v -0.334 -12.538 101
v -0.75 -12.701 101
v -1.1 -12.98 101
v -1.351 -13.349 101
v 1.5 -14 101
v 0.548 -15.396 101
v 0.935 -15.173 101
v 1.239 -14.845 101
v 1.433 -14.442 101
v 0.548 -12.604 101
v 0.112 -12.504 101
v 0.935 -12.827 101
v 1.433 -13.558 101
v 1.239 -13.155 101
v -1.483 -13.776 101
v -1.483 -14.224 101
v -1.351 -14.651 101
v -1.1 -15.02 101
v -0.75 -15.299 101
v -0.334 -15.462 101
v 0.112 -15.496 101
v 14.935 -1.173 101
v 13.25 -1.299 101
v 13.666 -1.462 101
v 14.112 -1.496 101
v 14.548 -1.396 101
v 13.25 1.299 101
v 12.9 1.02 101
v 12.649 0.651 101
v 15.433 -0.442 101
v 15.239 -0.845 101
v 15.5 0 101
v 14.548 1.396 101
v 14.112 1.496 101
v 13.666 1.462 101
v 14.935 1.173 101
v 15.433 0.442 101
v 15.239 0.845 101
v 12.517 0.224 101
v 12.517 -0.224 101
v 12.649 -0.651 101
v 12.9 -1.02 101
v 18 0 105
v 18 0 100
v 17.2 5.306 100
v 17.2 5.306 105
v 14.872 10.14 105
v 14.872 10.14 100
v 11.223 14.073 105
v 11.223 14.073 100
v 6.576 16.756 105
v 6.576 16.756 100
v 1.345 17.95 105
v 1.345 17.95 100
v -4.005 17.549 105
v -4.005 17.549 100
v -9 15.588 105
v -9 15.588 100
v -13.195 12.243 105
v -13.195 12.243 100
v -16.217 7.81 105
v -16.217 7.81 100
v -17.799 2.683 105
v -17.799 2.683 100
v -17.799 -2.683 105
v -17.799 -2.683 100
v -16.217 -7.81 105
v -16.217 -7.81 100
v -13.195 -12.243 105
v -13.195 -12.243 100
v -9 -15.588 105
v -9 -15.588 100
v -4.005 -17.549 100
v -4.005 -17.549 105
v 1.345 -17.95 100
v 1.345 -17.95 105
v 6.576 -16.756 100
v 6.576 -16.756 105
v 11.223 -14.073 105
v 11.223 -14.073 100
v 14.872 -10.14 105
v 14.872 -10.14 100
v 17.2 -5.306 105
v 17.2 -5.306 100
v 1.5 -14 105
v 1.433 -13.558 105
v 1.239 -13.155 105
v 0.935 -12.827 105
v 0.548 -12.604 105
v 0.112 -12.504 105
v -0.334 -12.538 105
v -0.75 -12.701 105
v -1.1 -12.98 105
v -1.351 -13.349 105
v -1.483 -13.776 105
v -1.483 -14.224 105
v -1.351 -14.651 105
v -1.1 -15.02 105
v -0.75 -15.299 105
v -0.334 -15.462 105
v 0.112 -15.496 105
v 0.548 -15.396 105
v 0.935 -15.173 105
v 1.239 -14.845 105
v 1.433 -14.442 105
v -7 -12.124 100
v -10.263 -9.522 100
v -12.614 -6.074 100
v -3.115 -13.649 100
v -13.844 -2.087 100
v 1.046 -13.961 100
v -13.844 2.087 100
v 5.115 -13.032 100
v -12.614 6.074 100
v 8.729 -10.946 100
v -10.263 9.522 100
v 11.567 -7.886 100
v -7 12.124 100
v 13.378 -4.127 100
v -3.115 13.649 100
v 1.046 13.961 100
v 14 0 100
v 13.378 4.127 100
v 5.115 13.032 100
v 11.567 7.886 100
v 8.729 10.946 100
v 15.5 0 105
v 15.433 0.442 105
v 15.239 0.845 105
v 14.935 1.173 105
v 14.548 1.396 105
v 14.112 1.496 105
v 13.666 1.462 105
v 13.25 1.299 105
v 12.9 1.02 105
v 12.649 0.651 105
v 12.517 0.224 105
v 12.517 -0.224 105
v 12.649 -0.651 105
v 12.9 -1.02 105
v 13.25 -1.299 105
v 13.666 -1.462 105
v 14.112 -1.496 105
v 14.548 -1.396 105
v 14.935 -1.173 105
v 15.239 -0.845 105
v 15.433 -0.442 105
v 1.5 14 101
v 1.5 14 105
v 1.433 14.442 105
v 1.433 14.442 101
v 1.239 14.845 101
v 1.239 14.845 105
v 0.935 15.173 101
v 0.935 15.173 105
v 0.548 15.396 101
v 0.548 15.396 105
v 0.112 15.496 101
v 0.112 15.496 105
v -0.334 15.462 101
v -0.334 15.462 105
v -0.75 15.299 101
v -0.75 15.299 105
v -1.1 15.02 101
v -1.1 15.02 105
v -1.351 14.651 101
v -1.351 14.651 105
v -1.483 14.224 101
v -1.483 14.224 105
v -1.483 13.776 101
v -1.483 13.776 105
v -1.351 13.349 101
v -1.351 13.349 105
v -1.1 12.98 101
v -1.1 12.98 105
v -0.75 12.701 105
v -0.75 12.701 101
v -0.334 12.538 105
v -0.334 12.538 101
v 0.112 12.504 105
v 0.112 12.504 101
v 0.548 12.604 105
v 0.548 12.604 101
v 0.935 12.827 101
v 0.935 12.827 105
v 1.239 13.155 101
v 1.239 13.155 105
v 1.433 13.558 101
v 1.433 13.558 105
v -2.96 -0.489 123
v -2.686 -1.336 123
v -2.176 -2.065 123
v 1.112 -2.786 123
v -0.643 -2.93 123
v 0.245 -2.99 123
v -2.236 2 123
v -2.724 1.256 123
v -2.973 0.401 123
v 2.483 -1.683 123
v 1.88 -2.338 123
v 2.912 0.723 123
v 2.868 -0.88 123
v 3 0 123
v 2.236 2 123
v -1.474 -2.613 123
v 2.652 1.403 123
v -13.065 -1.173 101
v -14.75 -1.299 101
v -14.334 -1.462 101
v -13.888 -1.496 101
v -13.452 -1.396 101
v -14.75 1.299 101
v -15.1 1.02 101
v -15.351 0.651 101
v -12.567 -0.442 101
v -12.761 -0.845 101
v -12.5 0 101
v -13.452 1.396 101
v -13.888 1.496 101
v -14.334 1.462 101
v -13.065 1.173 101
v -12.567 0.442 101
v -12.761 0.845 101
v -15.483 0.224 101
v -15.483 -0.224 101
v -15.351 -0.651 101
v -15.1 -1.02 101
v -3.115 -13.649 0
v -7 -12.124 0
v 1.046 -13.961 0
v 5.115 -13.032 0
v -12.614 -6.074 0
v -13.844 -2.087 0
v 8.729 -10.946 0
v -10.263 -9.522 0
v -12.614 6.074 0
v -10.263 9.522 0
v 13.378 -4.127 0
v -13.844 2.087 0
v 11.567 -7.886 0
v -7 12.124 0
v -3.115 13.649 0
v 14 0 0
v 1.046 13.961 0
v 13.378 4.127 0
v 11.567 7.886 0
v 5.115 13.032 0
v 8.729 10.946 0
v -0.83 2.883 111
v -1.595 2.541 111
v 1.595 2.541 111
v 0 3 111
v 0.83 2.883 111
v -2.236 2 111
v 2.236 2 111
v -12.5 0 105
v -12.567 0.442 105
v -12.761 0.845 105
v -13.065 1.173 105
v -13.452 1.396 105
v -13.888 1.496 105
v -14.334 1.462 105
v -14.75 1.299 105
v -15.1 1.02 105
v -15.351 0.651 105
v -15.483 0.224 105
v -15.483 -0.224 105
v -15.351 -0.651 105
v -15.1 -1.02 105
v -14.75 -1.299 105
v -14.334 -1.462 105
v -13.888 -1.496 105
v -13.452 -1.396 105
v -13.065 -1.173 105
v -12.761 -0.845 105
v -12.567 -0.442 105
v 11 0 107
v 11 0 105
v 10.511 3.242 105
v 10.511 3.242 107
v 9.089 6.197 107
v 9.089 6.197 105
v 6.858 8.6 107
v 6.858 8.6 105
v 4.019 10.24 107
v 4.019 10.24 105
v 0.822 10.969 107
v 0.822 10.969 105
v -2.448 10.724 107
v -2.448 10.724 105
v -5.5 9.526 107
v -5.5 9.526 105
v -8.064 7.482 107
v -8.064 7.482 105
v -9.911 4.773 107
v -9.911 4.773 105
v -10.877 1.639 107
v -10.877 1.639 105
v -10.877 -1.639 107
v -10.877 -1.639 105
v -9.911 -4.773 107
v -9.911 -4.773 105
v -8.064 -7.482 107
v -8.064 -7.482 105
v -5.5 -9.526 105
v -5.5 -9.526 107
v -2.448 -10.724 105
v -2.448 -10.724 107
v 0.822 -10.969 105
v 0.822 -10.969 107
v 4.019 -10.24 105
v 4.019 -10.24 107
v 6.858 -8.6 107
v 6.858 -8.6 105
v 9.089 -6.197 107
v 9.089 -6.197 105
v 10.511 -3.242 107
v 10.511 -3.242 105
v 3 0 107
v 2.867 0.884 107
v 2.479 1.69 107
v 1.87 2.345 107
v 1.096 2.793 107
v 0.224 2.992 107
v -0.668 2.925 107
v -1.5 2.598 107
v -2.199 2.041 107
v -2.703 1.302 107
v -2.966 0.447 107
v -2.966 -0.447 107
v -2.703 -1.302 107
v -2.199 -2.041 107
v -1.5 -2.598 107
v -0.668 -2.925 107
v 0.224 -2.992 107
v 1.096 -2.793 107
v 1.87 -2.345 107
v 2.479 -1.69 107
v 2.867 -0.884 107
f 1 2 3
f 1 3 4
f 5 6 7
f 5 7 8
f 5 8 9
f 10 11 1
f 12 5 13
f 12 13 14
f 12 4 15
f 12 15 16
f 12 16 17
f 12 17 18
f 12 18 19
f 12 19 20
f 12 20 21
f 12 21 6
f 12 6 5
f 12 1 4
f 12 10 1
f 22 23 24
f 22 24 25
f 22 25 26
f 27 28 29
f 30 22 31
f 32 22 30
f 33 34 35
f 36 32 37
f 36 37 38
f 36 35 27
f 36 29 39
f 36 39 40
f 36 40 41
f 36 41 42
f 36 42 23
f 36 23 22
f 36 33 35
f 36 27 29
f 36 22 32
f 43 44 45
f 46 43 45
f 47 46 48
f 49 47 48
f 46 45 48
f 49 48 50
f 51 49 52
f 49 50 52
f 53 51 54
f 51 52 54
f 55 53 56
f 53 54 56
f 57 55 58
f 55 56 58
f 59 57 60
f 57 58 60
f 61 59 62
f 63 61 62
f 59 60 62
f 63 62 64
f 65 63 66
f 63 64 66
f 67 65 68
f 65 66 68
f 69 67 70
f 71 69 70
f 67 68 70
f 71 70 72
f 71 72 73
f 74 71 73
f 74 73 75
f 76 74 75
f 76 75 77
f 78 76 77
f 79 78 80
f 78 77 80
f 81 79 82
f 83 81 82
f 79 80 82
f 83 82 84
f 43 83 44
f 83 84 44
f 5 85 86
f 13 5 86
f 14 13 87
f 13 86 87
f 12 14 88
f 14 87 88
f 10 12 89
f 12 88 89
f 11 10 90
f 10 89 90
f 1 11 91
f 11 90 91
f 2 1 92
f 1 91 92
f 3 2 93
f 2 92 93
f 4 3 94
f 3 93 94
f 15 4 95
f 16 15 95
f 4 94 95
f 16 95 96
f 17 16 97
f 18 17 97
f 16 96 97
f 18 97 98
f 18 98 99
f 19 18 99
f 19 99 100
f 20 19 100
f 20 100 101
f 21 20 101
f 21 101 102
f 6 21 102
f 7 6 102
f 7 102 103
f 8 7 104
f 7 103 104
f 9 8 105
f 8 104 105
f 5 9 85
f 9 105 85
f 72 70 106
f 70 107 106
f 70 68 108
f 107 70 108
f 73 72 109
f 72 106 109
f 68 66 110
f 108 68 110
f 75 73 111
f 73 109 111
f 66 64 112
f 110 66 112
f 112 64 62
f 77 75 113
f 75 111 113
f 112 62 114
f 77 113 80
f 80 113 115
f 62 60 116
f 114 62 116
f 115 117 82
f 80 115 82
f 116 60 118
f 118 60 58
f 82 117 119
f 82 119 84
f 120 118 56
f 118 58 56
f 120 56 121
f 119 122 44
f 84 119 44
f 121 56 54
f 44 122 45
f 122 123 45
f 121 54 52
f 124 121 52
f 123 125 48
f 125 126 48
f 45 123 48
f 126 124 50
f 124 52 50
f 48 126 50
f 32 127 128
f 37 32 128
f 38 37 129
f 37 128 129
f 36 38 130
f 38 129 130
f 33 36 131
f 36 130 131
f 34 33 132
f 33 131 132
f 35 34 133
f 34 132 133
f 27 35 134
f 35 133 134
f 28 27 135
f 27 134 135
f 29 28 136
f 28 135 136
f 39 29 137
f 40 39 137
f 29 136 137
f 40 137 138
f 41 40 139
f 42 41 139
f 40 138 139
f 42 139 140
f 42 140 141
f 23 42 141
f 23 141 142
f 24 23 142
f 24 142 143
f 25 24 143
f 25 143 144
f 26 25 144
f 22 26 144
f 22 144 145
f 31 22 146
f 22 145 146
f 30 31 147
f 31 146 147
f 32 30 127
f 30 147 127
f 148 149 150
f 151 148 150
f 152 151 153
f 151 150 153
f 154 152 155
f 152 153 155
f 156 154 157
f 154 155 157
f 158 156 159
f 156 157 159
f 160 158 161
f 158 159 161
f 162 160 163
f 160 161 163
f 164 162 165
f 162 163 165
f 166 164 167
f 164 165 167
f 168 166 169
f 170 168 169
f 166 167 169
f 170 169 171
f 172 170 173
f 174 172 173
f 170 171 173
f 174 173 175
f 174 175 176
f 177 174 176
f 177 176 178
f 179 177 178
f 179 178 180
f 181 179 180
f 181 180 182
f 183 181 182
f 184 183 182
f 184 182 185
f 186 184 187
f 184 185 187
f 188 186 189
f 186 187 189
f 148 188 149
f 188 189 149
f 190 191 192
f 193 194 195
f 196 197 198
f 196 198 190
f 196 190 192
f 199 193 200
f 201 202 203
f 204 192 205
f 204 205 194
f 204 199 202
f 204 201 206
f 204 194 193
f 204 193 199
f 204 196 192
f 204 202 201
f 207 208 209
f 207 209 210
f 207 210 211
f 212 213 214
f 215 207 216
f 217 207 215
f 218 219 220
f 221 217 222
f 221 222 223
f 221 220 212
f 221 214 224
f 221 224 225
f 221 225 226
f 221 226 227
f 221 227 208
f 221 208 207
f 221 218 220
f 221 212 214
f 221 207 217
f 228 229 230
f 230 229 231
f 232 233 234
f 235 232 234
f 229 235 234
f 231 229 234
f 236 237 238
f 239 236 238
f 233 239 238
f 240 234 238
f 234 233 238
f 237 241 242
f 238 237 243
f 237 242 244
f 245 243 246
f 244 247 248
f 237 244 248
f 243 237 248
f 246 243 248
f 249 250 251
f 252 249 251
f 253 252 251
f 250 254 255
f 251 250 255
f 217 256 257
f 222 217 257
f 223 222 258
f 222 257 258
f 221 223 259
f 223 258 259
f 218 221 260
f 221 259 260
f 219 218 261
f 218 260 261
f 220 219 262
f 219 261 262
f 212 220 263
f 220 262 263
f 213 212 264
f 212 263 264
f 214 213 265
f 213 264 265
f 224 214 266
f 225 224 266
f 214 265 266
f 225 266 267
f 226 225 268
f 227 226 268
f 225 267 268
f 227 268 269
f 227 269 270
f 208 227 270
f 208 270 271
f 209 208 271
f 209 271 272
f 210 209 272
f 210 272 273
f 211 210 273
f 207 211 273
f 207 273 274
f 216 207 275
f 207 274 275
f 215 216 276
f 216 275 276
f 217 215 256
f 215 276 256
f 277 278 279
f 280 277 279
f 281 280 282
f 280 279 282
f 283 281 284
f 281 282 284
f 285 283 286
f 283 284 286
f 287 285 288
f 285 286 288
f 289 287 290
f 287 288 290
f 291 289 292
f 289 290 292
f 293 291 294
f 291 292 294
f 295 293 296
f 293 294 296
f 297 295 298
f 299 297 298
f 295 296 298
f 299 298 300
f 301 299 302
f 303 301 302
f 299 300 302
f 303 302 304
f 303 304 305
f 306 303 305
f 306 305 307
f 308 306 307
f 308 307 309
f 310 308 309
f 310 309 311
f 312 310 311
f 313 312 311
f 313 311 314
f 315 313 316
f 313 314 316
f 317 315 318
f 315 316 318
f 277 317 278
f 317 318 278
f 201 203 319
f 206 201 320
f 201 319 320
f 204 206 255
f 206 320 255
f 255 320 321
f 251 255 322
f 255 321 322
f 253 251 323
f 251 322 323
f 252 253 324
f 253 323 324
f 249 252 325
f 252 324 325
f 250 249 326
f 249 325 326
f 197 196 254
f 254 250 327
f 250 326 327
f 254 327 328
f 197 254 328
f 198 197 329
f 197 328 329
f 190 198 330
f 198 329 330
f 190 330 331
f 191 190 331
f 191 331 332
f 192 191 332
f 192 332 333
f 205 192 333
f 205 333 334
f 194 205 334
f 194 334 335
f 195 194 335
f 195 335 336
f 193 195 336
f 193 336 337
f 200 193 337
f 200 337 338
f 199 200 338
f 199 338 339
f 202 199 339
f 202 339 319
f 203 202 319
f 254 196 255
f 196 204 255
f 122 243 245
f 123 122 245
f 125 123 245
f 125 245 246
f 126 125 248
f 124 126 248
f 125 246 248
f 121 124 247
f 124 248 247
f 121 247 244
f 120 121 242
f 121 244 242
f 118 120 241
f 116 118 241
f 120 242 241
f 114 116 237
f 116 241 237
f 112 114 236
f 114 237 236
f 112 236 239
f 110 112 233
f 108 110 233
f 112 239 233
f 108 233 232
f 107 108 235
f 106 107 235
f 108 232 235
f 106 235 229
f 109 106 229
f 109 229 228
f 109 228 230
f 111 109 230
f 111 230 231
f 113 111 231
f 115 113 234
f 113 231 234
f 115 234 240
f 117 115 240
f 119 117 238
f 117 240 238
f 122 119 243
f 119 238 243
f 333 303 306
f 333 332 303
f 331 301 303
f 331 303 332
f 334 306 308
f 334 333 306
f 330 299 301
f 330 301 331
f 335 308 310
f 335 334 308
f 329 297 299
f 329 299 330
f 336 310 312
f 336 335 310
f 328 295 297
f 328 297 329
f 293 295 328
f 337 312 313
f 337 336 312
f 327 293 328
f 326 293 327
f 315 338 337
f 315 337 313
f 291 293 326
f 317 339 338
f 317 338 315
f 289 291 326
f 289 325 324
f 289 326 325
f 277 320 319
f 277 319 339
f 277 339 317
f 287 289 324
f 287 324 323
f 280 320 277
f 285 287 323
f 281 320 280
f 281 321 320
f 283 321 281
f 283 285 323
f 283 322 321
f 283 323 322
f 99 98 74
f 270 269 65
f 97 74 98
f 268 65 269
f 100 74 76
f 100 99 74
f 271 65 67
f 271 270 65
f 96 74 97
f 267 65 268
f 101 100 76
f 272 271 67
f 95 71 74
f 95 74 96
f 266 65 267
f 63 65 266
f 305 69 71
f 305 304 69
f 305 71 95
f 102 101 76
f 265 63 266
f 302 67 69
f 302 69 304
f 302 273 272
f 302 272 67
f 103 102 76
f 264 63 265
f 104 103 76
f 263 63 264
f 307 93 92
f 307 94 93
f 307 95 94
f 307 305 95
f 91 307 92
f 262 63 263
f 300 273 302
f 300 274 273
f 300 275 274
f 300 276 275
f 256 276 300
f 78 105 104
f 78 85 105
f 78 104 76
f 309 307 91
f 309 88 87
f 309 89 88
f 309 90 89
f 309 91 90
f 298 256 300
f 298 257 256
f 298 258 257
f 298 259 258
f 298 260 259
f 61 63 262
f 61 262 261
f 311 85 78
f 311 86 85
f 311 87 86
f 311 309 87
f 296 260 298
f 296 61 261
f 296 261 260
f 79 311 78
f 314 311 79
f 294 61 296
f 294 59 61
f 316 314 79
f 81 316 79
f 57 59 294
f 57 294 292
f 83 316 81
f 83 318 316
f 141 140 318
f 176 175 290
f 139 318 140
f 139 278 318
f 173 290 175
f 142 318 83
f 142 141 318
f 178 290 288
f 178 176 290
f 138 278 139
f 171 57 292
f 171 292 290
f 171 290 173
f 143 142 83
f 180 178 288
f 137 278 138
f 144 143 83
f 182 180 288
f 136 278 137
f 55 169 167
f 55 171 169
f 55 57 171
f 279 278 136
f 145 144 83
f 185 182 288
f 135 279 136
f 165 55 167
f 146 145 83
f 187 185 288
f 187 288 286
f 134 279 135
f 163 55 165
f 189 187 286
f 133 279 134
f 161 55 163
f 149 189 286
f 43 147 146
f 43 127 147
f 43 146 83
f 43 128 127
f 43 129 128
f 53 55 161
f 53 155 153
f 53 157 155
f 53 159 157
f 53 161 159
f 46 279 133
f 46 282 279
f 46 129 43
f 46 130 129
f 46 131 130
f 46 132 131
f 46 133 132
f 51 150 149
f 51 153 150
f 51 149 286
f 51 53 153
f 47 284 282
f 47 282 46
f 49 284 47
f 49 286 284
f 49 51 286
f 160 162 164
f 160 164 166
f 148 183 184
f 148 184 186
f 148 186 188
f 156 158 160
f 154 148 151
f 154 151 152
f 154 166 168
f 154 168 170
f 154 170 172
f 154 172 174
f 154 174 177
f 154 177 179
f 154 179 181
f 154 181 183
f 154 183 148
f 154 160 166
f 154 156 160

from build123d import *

# Parameters (mm, degrees)
SKETCH1_R           = 14
BOSS_EXTRUDE3_DEPTH = 100
SKETCH4_R           = 18
BOSS_EXTRUDE4_DEPTH = 5
SKETCH5_R           = 1.5
CUT_EXTRUDE2_DEPTH  = 4
SKETCH6_R           = 11
BOSS_EXTRUDE6_DEPTH = 2
SKETCH7_R           = 3
BOSS_EXTRUDE7_DEPTH = 16
SKETCH8_W           = 13.782002666
SKETCH8_H           = 7.151039119
CUT_EXTRUDE3_DEPTH  = 8


with BuildPart() as part:
    # Sketch1 → Boss-Extrude3 (new body)
    with BuildSketch(Plane.XY):
        Circle(SKETCH1_R)
    extrude(amount=BOSS_EXTRUDE3_DEPTH)

    # Sketch4 → Boss-Extrude4 (add)
    with BuildSketch(Plane.XY.offset(100)):
        Circle(SKETCH4_R)
    extrude(amount=BOSS_EXTRUDE4_DEPTH)

    # Sketch5 → Cut-Extrude2 (cut)
    with BuildSketch(Plane.XY.offset(105)):
        with Locations((0, 14)):
            Circle(SKETCH5_R)
        with Locations((14, 0)):
            Circle(SKETCH5_R)
        with Locations((0, -14)):
            Circle(SKETCH5_R)
        with Locations((-14, 0)):
            Circle(SKETCH5_R)
    extrude(amount=-CUT_EXTRUDE2_DEPTH, mode=Mode.SUBTRACT)

    # Sketch6 → Boss-Extrude6 (add)
    with BuildSketch(Plane.XY.offset(105)):
        Circle(SKETCH6_R)
    extrude(amount=BOSS_EXTRUDE6_DEPTH)

    # Sketch7 → Boss-Extrude7 (add)
    with BuildSketch(Plane.XY.offset(107)):
        Circle(SKETCH7_R)
    extrude(amount=BOSS_EXTRUDE7_DEPTH)

    # Sketch8 → Cut-Extrude3 (cut, symmetric)
    with BuildSketch(Plane(origin=(0, 0, 0), x_dir=(0, 0, -1), z_dir=(1, 0, 0))):
        with Locations((-117.891001333, 5.575519559)):
            Rectangle(SKETCH8_W, SKETCH8_H)
    extrude(amount=CUT_EXTRUDE3_DEPTH, both=True, mode=Mode.SUBTRACT)


solid = part.part
